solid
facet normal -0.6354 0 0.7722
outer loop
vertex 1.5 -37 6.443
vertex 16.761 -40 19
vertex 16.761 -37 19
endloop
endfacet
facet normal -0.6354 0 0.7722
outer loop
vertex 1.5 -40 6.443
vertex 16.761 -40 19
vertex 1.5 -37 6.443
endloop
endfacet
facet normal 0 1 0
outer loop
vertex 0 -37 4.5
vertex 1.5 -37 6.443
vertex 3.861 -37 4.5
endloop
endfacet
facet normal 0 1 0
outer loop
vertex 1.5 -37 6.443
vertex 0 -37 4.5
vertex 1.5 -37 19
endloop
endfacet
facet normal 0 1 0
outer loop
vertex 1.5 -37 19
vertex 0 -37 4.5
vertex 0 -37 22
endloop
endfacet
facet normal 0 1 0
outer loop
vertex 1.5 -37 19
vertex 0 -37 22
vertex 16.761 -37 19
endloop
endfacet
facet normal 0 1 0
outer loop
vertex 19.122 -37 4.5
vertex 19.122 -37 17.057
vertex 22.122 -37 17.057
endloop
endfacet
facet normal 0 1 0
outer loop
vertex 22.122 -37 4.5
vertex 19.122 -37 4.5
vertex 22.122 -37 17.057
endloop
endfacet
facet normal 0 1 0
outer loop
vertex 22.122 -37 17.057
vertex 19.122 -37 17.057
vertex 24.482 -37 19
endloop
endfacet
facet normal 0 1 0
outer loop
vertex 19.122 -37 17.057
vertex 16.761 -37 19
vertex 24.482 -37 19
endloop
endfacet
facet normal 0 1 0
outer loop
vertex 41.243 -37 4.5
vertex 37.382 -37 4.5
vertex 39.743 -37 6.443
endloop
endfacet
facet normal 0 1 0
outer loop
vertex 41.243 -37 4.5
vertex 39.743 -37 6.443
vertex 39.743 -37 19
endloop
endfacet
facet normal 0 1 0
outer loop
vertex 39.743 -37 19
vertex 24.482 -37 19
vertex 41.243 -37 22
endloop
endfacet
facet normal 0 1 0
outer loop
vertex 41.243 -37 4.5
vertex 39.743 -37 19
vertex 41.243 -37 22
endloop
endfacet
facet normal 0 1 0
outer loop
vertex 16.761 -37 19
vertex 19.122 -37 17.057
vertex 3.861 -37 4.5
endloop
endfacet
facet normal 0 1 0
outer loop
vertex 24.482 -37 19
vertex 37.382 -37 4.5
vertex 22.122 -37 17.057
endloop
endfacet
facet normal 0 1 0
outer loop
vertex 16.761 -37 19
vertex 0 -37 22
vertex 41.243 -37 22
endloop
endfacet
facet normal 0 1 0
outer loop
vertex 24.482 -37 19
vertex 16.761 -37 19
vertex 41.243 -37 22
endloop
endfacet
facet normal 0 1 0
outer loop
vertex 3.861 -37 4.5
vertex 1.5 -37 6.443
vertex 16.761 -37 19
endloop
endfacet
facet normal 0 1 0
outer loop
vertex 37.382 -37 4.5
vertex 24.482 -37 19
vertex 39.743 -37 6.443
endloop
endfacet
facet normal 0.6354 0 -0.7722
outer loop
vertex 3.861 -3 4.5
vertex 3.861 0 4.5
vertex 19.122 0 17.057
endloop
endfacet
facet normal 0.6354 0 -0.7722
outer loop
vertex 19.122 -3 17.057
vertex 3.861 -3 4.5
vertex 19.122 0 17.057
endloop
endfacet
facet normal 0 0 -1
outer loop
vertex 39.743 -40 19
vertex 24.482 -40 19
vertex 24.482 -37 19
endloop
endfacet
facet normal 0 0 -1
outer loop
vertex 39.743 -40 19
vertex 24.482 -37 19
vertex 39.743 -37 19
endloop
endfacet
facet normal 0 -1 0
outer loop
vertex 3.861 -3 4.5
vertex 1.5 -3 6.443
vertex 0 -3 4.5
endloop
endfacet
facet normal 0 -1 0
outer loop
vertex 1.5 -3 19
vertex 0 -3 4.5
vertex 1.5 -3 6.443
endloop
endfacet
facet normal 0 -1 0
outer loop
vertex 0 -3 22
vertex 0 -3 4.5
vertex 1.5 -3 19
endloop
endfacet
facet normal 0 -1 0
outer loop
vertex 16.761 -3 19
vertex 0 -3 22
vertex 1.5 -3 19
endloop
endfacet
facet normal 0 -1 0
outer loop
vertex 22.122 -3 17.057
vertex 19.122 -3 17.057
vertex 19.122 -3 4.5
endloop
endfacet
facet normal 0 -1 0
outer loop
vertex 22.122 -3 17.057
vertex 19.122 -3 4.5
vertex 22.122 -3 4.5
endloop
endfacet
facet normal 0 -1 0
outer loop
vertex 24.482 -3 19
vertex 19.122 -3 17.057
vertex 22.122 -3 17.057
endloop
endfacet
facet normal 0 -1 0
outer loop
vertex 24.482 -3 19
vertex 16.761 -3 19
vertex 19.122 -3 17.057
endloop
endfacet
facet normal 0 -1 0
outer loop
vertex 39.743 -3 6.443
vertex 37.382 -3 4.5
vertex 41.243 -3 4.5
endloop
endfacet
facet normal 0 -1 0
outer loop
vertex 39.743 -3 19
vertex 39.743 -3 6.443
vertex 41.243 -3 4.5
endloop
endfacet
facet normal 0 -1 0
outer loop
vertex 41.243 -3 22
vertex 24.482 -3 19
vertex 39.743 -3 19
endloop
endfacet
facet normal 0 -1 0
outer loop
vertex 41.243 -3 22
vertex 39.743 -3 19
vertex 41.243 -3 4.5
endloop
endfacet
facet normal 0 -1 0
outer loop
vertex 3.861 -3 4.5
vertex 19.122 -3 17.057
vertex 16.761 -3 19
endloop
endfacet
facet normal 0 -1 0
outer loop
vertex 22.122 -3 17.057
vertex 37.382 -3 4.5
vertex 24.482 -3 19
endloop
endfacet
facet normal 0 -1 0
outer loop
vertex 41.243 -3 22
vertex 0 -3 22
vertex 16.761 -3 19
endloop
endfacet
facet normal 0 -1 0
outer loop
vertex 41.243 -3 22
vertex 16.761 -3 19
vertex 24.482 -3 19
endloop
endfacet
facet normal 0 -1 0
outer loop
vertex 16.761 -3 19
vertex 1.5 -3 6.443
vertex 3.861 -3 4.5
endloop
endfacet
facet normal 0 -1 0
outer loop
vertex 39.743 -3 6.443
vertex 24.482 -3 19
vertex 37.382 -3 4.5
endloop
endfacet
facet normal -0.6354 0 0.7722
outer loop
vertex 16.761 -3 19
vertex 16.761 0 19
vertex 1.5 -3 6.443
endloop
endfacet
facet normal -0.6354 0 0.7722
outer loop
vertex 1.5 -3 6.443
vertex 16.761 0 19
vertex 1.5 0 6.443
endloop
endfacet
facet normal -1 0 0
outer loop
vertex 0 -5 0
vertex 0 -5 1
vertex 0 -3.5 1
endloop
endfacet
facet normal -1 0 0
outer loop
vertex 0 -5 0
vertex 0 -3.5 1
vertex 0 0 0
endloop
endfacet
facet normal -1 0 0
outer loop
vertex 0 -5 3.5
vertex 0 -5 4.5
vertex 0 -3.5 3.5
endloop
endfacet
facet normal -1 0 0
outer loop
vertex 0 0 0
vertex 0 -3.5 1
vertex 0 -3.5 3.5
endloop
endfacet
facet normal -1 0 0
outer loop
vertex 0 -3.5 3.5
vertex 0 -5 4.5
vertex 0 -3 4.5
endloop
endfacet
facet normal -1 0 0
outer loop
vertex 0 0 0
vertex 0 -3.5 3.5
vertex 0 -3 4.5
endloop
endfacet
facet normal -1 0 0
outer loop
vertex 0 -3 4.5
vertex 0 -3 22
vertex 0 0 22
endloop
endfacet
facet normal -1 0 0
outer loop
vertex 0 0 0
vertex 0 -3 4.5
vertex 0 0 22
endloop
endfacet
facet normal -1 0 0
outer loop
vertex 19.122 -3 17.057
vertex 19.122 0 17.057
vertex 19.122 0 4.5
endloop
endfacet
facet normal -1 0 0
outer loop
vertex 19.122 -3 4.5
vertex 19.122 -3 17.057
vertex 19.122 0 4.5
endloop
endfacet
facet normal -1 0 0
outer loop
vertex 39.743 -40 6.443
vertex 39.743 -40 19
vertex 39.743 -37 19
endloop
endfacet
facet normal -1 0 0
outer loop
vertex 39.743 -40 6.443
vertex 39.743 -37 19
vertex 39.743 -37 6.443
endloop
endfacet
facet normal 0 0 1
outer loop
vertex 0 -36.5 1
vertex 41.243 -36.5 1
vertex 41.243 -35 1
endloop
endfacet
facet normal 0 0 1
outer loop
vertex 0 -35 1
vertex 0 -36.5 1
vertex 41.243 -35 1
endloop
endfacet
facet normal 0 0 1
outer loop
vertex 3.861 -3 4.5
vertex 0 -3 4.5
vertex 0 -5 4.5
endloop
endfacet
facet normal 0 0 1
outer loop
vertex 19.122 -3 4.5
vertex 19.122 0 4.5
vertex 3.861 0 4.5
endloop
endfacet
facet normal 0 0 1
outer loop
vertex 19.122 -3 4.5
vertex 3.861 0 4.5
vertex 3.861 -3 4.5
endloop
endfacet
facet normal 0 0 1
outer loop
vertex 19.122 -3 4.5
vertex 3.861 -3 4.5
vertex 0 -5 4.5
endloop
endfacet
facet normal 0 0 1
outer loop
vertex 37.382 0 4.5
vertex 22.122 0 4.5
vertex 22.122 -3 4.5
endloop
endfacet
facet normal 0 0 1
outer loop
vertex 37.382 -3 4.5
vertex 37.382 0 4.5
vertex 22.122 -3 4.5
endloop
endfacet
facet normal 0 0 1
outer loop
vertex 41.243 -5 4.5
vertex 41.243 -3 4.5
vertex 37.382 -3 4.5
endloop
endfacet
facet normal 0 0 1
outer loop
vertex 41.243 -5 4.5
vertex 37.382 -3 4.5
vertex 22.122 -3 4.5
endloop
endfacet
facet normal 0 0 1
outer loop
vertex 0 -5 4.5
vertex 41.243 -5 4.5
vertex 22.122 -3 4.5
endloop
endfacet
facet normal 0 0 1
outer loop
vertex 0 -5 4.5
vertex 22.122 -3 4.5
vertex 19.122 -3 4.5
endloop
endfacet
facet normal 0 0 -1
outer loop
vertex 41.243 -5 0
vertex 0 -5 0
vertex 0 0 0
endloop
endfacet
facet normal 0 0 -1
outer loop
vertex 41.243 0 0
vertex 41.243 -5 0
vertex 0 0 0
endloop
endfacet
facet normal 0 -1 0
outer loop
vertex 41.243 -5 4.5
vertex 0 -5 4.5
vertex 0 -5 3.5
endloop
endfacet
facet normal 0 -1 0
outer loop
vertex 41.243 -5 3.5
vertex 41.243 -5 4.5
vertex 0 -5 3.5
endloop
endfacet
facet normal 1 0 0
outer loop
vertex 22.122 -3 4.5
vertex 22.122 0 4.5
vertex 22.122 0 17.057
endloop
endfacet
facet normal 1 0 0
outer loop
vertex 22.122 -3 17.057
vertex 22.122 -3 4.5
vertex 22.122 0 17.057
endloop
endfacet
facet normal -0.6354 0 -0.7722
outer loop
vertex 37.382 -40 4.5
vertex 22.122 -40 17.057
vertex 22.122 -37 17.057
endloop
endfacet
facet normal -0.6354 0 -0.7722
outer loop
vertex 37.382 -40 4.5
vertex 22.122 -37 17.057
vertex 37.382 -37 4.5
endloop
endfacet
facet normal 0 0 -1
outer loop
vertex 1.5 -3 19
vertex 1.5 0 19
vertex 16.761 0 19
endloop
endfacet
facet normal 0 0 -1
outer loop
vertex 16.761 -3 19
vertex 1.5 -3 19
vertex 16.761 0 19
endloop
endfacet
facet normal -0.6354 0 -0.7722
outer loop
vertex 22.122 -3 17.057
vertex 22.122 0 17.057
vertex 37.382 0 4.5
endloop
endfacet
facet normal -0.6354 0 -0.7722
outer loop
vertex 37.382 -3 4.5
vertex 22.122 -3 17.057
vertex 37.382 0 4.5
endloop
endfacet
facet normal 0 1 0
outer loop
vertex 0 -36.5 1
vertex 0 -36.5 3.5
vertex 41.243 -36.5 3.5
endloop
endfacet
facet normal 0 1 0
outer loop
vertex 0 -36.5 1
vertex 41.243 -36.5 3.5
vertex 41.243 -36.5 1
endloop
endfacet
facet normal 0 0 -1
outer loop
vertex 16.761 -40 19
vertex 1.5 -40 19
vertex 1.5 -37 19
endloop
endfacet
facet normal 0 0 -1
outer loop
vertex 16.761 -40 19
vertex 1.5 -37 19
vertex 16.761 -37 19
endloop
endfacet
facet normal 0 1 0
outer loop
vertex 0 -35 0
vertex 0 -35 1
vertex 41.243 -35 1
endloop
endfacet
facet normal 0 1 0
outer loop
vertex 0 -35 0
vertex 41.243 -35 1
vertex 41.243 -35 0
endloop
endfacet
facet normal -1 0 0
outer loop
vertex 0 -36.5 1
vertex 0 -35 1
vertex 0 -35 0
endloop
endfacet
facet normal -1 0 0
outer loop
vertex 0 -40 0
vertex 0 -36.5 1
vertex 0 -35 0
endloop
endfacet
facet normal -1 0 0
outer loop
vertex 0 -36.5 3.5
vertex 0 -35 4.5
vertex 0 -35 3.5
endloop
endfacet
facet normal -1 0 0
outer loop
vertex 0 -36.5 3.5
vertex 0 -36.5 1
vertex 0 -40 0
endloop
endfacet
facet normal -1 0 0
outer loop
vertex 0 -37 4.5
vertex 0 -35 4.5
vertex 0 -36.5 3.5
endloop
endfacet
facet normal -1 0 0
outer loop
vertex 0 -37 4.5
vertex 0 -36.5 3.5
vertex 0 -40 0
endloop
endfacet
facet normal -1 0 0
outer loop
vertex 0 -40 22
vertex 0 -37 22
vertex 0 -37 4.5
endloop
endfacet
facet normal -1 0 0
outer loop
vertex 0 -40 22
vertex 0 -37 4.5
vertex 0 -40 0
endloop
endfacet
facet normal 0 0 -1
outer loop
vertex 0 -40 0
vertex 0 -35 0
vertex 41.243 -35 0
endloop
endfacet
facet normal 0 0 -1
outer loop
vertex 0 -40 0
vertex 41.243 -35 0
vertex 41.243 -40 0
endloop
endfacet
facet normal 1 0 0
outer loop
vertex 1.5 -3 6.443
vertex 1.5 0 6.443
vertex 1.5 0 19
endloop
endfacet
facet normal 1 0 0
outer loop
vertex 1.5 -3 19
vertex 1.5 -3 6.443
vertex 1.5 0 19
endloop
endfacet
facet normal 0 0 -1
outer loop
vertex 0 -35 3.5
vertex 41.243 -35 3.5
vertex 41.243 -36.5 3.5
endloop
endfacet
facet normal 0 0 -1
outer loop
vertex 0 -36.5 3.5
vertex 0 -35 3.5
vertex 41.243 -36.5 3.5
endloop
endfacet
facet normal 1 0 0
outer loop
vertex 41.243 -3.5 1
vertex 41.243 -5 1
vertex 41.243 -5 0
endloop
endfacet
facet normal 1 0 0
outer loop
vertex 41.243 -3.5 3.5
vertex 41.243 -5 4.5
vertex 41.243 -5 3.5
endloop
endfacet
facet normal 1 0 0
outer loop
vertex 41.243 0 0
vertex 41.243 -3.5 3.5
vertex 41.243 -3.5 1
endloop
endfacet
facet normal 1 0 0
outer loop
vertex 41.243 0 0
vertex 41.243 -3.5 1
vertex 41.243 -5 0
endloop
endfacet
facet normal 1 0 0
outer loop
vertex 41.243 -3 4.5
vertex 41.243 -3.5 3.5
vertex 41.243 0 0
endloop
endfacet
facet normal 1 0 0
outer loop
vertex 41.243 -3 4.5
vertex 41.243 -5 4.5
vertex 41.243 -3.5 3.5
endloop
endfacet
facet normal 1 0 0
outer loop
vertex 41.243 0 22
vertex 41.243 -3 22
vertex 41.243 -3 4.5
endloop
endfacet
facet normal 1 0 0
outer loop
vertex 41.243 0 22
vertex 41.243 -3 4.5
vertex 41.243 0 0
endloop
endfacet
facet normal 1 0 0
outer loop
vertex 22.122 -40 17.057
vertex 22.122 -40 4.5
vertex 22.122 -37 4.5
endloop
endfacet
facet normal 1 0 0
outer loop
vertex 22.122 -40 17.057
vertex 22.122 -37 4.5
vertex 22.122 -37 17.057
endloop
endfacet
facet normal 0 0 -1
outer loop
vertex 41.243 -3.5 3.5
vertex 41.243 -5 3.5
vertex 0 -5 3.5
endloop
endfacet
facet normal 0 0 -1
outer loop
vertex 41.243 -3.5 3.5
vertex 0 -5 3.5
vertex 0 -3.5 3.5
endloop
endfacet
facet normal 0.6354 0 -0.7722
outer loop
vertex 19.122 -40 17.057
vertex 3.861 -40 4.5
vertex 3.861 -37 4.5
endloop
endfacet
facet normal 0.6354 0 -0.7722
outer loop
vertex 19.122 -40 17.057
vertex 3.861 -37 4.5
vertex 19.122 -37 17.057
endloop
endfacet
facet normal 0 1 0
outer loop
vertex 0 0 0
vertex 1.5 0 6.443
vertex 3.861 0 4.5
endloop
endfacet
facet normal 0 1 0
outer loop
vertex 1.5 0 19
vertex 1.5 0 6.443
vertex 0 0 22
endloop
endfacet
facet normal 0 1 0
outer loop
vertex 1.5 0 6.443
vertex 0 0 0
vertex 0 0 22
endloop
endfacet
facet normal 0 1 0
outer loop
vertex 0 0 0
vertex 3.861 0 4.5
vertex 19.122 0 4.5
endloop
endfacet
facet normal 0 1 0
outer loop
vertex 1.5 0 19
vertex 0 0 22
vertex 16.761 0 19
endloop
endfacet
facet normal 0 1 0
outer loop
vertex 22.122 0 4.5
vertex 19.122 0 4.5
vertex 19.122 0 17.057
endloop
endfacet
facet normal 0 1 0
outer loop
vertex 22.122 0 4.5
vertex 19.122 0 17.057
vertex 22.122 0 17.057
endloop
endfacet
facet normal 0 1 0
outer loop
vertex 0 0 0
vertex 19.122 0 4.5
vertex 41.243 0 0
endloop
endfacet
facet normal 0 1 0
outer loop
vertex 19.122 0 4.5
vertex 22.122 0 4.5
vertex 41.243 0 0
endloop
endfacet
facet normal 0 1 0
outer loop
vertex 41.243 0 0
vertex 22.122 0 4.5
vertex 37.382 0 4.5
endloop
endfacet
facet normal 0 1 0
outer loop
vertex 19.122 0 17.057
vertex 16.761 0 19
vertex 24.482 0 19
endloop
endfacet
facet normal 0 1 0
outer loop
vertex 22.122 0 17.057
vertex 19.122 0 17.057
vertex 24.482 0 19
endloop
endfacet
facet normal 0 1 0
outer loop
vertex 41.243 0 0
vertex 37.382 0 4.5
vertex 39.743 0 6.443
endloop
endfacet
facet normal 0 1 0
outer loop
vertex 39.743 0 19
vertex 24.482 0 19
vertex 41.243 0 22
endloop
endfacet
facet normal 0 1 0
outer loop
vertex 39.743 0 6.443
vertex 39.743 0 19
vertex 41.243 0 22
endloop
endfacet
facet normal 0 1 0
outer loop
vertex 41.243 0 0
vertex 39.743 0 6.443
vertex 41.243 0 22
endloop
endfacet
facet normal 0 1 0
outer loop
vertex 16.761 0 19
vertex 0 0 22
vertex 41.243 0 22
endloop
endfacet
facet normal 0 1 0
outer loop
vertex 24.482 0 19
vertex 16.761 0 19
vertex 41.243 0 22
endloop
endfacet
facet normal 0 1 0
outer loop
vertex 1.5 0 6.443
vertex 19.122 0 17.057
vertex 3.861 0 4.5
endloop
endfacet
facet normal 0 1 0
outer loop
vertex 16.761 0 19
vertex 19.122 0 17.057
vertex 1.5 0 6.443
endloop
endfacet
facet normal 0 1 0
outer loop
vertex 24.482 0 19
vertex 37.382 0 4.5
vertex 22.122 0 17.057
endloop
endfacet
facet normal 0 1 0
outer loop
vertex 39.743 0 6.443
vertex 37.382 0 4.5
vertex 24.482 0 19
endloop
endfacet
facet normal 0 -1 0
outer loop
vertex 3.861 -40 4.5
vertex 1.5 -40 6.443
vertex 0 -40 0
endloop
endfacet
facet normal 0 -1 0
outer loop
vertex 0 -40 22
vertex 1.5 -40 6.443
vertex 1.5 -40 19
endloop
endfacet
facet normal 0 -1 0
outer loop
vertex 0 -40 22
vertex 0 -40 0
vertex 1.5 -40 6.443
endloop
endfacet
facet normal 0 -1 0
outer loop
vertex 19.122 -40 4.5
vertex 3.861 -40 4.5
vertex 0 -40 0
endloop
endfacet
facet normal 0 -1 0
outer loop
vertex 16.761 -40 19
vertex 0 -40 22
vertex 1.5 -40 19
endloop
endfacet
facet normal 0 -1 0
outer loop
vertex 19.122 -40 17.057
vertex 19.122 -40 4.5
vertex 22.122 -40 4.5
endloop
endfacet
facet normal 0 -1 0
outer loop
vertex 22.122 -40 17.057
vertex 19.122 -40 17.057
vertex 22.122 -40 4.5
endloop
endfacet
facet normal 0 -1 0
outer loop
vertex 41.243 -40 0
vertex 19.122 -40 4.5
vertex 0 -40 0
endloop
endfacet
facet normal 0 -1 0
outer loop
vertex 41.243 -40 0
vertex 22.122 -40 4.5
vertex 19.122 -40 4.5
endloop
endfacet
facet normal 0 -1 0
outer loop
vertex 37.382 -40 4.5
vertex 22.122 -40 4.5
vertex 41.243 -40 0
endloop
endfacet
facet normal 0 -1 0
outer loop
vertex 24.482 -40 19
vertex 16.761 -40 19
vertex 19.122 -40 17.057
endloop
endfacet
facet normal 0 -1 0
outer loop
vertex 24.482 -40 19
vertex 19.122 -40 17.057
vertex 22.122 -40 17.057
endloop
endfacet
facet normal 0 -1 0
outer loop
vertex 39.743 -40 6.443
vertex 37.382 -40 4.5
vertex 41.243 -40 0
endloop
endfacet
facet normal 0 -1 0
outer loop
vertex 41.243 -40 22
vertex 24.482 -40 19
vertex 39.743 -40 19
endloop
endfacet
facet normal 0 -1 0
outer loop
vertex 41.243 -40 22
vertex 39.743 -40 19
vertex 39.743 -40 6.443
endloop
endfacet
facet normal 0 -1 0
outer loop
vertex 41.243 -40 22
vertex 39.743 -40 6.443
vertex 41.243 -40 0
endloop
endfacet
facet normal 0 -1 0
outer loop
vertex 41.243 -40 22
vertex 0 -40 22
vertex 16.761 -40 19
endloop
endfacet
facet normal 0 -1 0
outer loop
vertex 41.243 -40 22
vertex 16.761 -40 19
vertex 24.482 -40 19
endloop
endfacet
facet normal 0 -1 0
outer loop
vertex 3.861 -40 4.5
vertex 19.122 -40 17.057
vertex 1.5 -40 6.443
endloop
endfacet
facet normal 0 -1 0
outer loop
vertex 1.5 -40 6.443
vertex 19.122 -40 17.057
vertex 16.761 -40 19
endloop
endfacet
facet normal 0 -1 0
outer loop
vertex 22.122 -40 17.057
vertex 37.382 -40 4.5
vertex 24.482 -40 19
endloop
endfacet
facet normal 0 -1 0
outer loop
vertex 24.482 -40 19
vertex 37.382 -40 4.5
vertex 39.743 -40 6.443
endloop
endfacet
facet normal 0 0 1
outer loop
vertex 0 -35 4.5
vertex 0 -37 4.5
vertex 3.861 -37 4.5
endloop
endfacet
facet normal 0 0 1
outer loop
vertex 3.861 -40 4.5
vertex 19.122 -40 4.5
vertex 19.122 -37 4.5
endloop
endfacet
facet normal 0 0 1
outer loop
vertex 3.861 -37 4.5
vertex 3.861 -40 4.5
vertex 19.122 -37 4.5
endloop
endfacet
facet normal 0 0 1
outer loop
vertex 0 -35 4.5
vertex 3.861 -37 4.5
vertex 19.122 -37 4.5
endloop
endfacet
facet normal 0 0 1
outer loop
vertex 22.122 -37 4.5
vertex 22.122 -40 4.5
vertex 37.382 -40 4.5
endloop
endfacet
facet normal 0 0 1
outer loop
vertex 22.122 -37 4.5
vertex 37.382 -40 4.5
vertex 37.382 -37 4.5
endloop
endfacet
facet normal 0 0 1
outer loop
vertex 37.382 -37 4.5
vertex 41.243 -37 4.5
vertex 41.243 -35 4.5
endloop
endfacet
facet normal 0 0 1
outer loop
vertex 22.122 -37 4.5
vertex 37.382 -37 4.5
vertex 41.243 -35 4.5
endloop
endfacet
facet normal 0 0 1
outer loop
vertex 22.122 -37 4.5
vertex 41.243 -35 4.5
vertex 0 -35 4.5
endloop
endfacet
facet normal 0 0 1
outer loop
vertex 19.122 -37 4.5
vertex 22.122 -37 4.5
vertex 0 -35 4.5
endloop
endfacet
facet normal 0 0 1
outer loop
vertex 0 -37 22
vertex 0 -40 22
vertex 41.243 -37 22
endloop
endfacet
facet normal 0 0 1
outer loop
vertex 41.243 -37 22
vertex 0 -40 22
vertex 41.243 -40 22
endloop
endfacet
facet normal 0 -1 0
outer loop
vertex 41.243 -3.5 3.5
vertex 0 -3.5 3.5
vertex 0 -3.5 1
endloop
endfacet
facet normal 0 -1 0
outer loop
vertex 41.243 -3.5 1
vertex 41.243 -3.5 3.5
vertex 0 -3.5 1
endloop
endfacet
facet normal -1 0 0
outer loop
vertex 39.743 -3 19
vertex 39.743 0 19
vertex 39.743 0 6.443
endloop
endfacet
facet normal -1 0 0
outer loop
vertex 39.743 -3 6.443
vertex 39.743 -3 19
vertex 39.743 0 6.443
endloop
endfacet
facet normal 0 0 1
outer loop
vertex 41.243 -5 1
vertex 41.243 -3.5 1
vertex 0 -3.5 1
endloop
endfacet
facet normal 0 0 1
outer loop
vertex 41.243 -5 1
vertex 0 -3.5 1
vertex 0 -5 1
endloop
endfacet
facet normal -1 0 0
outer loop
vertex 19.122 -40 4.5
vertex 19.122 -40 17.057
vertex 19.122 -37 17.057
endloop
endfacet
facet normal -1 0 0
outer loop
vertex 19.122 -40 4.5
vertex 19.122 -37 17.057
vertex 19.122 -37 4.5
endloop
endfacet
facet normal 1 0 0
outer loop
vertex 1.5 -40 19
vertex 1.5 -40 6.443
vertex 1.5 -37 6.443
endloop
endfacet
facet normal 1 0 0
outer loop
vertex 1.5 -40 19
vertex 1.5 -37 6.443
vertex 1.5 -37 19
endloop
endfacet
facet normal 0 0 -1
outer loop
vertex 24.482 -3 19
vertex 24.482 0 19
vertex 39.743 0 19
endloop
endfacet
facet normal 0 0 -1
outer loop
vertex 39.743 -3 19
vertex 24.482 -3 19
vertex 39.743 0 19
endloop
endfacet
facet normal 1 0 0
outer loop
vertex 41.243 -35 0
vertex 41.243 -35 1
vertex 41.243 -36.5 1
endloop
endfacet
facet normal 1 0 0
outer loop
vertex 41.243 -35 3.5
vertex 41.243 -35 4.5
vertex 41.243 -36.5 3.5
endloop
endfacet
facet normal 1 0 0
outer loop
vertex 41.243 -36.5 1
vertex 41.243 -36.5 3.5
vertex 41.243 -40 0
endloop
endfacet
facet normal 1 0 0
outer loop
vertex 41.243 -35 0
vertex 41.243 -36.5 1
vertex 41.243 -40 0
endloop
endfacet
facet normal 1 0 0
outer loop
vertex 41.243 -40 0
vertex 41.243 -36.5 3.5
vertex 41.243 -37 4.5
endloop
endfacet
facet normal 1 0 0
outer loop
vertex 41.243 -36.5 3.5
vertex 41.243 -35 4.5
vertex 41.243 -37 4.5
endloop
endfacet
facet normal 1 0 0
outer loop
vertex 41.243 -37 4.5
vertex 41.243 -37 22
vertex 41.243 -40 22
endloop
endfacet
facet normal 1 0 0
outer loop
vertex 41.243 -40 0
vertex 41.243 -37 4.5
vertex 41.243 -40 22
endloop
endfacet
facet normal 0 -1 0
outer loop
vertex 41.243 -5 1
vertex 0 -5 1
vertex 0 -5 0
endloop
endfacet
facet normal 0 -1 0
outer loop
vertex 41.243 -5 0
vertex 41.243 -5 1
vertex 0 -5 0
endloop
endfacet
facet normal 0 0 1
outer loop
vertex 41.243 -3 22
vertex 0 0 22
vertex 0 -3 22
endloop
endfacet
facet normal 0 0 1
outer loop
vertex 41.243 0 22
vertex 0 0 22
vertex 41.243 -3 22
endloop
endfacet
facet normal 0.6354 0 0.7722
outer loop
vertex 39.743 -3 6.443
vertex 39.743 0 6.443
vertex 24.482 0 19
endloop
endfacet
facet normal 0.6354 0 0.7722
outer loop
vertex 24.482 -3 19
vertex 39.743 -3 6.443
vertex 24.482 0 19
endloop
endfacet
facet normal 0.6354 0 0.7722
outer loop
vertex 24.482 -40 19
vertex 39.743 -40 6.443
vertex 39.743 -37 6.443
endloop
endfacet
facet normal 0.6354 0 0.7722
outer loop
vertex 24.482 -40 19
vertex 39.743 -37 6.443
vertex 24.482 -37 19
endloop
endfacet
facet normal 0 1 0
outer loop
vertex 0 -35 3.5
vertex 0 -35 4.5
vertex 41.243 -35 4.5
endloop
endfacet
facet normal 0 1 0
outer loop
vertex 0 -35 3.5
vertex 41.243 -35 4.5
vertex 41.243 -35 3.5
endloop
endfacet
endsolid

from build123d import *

# Parameters (mm, degrees)
F0_W     = 41.243
F0_H     = 22
F1_DEPTH = 3
F3_DEPTH = 41.243


with BuildPart() as f1:
    # F0 (on Front) → F1 (new body)
    with BuildSketch(Plane.XZ):
        with Locations((20.6215, 11)):
            Rectangle(F0_W, F0_H)
        Polygon((3.8607233419, 4.5), (19.1215, 17.0574588737), (19.1215, 4.5), align=None, mode=Mode.SUBTRACT)
        Polygon((22.1215, 17.0574588737), (37.3822766581, 4.5), (22.1215, 4.5), align=None, mode=Mode.SUBTRACT)
        Polygon((1.5, 6.4425411263), (1.5, 19), (16.7607766581, 19), align=None, mode=Mode.SUBTRACT)
        Polygon((24.4822233419, 19), (39.743, 19), (39.743, 6.4425411263), align=None, mode=Mode.SUBTRACT)
    extrude(amount=F1_DEPTH)

    # F2 (on face) → F3 (join, through all)
    with BuildSketch(Plane.YZ.offset(41.243)):
        Polygon((-5, 0), (-3, 0), (-3, 4.5), (-5, 4.5), (-5, 3.5), (-3.5, 3.5), (-3.5, 1), (-5, 1), align=None)
    extrude(amount=-F3_DEPTH)


with BuildPart() as f5_1:
    # F5: instance of F1
    add(f1.part.mirror(Plane.XZ.offset(20)))


solid = Compound([f1.part, f5_1.part])
